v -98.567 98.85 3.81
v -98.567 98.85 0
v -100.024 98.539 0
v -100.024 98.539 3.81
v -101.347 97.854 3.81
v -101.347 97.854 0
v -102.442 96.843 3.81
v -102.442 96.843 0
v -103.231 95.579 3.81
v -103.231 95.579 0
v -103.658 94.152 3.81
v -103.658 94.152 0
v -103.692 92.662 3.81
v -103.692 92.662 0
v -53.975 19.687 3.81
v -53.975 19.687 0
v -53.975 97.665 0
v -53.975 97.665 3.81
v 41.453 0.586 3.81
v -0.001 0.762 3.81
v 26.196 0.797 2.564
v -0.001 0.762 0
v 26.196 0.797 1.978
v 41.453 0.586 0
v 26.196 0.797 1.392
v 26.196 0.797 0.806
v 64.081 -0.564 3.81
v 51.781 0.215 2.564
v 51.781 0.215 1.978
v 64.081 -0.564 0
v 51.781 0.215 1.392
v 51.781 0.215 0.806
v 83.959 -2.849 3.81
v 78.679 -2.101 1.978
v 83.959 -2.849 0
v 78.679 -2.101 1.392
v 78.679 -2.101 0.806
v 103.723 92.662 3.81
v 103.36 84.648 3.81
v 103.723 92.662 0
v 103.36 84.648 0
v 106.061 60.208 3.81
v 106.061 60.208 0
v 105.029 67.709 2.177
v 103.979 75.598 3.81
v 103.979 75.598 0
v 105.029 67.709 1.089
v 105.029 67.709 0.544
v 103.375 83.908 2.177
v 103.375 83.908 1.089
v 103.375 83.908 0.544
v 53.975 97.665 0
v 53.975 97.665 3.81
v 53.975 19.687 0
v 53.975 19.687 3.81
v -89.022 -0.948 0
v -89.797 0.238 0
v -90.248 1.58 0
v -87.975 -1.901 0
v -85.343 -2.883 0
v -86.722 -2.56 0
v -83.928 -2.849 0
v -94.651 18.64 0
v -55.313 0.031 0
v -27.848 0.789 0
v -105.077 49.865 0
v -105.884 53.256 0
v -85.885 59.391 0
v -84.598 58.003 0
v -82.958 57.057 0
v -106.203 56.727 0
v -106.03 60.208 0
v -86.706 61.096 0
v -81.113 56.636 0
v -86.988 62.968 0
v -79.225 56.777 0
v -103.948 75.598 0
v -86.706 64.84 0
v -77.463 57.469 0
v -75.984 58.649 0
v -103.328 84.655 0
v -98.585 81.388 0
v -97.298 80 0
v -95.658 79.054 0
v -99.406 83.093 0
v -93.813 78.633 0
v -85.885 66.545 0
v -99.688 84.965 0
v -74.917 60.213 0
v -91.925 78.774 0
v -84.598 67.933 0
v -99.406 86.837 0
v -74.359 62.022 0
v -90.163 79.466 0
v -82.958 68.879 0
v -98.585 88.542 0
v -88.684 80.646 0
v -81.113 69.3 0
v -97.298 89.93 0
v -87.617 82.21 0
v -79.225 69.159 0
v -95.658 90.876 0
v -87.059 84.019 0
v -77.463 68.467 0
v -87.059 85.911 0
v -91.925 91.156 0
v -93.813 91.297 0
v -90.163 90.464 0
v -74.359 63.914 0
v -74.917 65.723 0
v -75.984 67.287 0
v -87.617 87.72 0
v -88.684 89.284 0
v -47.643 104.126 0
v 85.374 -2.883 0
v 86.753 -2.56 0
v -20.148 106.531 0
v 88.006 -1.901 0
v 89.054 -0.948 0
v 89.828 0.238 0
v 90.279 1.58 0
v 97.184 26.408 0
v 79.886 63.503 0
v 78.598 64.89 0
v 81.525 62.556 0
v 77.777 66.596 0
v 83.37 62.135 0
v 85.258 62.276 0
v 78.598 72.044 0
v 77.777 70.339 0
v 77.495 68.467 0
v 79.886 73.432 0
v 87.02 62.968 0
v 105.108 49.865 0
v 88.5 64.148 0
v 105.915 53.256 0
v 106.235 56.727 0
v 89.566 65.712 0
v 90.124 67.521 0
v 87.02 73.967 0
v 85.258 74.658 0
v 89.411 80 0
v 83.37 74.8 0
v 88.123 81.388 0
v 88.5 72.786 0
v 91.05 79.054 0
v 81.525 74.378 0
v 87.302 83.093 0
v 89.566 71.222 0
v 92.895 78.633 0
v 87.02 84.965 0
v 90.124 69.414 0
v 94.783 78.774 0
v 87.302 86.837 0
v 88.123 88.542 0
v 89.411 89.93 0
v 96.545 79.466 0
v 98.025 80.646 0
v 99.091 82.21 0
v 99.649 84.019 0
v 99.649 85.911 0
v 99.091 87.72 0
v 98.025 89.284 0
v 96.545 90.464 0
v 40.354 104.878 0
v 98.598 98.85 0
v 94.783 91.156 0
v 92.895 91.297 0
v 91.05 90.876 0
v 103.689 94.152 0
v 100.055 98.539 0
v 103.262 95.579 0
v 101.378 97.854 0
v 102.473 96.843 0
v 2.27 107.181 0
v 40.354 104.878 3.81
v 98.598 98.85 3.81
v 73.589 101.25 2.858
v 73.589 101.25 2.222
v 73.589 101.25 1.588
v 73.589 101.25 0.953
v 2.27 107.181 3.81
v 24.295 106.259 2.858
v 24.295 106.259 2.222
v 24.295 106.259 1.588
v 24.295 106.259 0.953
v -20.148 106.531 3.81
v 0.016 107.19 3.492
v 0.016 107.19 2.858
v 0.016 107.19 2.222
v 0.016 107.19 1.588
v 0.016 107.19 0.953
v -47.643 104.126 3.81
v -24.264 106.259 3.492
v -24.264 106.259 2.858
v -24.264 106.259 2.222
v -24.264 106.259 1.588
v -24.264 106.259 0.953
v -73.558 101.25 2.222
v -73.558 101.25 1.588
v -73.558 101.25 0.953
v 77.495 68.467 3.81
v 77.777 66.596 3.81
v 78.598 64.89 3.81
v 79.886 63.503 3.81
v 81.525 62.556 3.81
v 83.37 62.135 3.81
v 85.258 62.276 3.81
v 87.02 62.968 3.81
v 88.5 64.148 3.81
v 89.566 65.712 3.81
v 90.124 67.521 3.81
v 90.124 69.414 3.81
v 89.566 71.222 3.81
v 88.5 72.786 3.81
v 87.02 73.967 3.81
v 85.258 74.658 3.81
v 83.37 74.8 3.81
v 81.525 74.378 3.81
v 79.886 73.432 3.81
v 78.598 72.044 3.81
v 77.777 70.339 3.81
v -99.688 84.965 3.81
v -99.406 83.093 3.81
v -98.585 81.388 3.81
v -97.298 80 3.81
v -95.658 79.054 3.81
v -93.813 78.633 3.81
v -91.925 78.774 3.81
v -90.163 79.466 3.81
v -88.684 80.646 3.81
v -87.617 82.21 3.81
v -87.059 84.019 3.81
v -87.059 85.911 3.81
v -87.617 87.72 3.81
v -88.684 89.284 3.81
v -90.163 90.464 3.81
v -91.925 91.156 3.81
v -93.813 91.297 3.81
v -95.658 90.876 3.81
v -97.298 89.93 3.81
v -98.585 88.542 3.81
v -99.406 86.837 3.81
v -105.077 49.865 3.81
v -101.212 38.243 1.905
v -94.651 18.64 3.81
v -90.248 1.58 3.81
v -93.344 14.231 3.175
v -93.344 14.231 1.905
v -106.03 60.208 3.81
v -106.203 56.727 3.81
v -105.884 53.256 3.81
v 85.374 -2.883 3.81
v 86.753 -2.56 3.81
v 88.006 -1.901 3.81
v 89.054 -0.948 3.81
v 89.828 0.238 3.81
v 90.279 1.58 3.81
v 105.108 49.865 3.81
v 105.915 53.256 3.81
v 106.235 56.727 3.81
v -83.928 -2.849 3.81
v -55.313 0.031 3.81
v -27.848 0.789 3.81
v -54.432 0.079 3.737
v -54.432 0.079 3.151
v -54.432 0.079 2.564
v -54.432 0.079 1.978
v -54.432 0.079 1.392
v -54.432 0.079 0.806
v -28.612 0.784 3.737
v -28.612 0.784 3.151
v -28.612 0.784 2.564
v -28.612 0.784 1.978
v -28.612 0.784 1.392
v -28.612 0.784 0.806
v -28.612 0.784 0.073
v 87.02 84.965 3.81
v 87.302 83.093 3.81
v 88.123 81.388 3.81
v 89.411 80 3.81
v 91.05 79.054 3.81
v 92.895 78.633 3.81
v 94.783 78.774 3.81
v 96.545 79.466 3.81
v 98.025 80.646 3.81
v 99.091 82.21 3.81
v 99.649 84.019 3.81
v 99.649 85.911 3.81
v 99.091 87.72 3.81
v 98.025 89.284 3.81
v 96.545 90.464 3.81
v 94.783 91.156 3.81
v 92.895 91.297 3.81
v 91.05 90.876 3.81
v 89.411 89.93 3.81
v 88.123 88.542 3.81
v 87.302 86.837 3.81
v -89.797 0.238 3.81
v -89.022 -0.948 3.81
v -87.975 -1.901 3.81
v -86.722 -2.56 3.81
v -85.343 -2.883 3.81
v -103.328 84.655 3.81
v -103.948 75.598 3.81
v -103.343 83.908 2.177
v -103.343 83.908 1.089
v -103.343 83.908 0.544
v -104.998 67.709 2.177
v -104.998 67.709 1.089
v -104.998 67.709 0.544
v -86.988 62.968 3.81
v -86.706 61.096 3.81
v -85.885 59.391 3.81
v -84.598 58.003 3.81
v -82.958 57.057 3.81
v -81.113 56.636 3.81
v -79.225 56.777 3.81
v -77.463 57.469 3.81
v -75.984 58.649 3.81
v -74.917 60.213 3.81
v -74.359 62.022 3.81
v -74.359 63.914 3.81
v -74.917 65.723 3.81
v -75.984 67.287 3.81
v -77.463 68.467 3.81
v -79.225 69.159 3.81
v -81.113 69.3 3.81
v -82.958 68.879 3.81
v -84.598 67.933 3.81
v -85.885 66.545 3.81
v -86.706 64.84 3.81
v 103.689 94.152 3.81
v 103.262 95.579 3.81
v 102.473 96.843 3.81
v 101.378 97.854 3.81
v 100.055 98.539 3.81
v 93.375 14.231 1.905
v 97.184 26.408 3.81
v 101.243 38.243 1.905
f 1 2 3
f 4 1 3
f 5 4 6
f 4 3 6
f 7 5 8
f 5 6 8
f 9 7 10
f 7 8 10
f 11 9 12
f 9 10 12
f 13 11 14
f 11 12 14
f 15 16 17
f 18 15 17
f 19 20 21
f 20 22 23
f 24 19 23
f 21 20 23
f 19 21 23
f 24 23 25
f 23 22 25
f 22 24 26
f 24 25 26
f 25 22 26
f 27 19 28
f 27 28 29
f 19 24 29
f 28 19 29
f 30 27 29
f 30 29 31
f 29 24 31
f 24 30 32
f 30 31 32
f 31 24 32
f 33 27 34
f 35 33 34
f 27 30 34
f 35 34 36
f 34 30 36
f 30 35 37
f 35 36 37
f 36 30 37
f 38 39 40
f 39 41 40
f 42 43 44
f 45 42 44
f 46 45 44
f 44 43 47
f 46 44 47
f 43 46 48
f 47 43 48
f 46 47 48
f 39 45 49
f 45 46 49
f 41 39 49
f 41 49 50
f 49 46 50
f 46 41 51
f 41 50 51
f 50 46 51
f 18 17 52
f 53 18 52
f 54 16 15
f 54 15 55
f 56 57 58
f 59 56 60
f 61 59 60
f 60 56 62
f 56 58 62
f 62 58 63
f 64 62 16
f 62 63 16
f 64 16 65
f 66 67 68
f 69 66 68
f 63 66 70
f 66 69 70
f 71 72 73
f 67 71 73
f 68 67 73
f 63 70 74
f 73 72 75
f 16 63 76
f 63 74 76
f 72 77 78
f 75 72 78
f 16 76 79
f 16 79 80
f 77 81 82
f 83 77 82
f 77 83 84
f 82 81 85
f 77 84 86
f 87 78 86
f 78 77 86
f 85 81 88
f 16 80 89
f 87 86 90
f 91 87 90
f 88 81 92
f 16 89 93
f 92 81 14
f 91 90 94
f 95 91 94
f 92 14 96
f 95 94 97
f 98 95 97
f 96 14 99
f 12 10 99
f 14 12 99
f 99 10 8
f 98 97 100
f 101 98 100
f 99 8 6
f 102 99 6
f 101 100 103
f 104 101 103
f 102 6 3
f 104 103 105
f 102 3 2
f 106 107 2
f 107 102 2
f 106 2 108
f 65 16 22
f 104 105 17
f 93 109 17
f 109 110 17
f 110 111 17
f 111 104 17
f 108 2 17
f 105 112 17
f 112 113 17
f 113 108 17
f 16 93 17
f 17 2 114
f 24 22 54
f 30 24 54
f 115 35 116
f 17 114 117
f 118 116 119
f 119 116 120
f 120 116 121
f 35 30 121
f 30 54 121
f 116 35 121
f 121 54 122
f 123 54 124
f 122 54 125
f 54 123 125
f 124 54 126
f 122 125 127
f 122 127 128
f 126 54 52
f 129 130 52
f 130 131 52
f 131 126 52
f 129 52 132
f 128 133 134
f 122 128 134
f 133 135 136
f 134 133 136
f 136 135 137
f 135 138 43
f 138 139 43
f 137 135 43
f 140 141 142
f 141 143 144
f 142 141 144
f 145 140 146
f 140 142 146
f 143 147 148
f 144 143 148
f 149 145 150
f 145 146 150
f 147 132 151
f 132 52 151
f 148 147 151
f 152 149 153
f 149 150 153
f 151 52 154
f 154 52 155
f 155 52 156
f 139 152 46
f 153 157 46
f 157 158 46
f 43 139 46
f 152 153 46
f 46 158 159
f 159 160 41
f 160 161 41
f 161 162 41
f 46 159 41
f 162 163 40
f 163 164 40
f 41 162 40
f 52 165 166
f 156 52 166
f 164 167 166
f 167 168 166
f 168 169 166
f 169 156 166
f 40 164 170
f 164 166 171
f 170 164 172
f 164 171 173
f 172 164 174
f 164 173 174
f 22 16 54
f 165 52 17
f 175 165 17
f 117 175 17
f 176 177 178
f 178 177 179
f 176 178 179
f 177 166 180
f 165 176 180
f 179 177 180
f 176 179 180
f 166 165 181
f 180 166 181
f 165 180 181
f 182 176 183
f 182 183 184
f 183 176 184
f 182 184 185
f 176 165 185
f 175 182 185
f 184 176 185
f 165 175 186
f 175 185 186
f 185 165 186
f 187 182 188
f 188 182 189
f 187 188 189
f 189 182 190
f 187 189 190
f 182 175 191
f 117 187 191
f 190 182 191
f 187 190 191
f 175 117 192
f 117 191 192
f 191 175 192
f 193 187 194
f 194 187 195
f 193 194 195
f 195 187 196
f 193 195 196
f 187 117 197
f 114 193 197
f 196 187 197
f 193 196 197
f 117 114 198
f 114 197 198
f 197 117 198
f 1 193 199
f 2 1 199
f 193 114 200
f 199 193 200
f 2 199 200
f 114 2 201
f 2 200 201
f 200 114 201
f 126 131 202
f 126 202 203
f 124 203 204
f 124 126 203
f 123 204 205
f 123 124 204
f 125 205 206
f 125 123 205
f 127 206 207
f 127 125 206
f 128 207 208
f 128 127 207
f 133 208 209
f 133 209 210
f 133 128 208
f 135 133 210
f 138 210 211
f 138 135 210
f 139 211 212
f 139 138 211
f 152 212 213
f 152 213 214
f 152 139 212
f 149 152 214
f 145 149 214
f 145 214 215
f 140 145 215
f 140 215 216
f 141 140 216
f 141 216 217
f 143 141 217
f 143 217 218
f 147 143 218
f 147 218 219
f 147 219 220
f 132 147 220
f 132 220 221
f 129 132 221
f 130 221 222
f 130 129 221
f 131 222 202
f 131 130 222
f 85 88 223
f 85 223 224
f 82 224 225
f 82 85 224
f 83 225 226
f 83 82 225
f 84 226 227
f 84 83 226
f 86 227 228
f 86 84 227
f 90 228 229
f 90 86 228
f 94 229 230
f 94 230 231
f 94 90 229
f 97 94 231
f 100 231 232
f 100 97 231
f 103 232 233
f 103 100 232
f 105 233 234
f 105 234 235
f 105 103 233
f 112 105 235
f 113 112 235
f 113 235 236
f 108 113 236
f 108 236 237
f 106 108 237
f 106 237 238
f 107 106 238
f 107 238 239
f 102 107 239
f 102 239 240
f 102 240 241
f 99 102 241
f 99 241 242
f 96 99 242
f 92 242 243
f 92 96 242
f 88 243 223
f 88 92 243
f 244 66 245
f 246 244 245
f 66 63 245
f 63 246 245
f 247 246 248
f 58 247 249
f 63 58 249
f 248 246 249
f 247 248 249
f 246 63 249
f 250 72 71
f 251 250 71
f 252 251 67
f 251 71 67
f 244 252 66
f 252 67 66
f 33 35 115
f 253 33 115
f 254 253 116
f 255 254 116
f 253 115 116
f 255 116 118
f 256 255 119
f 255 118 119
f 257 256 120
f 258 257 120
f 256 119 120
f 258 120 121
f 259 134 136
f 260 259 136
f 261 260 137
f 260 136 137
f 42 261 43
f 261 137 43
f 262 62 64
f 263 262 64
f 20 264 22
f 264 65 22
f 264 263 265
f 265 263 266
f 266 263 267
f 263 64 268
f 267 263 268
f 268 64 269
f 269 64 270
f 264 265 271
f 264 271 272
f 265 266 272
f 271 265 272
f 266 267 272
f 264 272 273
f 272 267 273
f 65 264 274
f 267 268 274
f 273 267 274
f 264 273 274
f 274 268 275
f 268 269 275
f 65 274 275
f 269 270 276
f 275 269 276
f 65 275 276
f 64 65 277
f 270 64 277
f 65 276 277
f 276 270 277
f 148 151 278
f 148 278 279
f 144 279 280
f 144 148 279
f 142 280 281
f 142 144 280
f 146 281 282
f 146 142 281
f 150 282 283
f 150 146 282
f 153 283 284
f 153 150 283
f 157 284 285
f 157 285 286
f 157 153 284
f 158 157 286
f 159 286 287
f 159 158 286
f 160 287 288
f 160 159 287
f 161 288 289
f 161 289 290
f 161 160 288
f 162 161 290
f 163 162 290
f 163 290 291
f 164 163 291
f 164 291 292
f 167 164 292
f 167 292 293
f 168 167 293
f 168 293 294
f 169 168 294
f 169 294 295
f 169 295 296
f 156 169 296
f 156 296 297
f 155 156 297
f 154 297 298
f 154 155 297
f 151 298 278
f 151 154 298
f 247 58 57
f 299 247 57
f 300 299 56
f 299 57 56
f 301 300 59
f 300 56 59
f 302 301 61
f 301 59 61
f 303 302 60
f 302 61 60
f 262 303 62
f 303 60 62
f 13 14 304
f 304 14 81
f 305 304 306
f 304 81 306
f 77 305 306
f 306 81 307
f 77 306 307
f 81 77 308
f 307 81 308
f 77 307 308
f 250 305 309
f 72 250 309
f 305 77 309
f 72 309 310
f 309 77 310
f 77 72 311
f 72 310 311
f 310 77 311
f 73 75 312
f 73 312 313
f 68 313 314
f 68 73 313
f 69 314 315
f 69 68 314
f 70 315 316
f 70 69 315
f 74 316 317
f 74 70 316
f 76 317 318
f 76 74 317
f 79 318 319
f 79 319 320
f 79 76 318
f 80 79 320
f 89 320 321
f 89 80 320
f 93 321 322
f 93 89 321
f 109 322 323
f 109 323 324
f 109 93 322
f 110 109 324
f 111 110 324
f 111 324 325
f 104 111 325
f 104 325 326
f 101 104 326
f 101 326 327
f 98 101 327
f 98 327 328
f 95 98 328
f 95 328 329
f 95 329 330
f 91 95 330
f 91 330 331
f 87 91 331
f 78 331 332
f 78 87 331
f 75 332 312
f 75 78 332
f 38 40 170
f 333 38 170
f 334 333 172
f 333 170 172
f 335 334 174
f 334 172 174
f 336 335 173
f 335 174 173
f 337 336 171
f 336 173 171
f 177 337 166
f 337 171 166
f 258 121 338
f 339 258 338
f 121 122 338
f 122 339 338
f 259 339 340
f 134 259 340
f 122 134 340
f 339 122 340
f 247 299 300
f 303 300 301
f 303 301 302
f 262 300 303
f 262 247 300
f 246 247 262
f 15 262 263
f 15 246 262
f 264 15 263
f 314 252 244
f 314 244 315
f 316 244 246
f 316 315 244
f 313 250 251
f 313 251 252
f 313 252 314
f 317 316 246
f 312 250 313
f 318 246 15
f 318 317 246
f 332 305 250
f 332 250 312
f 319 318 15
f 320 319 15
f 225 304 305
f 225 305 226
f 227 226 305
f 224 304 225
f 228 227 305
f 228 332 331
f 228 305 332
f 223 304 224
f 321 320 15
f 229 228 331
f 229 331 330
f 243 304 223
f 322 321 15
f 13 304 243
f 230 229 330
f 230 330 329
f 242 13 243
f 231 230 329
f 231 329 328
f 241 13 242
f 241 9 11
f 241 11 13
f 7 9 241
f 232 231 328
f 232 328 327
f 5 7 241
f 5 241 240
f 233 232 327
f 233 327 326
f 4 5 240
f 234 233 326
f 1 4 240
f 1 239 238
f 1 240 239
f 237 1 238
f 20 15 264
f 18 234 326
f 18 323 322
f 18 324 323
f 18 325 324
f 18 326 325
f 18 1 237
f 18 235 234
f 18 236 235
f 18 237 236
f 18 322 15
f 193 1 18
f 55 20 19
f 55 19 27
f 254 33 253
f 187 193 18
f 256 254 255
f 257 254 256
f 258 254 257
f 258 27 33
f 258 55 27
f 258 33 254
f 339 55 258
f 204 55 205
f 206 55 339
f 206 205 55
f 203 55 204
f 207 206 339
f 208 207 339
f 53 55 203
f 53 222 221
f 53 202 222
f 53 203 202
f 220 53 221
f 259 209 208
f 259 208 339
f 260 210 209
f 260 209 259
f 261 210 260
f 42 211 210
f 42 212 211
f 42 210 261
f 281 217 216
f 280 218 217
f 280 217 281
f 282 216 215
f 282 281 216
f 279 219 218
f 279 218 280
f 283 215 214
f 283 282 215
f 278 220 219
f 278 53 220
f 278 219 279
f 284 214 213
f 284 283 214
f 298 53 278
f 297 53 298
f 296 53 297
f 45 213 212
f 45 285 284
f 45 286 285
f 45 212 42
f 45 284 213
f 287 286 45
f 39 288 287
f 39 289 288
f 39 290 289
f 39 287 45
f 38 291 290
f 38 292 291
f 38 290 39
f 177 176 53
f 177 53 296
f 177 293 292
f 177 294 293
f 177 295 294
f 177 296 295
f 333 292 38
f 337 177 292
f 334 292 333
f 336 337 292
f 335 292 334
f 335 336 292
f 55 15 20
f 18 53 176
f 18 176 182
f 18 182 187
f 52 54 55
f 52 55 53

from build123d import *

# Parameters (mm, degrees)
SKETCH1_R           = 6.35
SKETCH1_W           = 107.95
SKETCH1_H           = 77.978
BOSS_EXTRUDE1_DEPTH = 3.81


with BuildPart() as part:
    # Sketch1 → Boss-Extrude1 (new body)
    with BuildSketch(Plane.XY):
        with BuildLine():
            ThreePointArc((-90.247945126, 1.580161299), (-87.975141882, -1.900637883), (-83.927585414, -2.848732901))
            add(Edge.make_bspline(
                [(-83.927585414, -2.848732901), (-83.054070471, -2.715786742), (-81.312732205, -2.460099658), (-78.654295906, -2.097457818), (-75.966491195, -1.758240891), (-72.336992818, -1.336160635), (-68.643939449, -0.959865866), (-65.583983691, -0.690535221), (-64.166779255, -0.573734085), (-63.566148315, -0.525577724), (-63.104217983, -0.489316665), (-62.699894104, -0.457970525), (-61.962459601, -0.401810292), (-60.915867879, -0.325087188), (-59.217621249, -0.20679221), (-57.068227268, -0.068668175), (-54.439670256, 0.082013873), (-51.767032951, 0.217415022), (-49.490906759, 0.318006821), (-48.009034739, 0.376639561), (-47.303600356, 0.403182815), (-46.87624745, 0.418937653), (-46.196192411, 0.443333549), (-45.175910497, 0.47801298), (-43.54019985, 0.529440772), (-41.442918551, 0.587830962), (-38.856544752, 0.647964805), (-36.195775126, 0.698343729), (-33.919375463, 0.73216057), (-32.406847373, 0.750213929), (-31.706246722, 0.757752509), (-31.408404648, 0.760817662), (-31.181163199, 0.763075054), (-31.021391801, 0.764629932), (-30.707730066, 0.767603553), (-30.26986268, 0.771505625), (-29.546357408, 0.777455403), (-28.619562792, 0.78413893), (-27.465024779, 0.791021083), (-25.871235622, 0.798660769), (-23.776420321, 0.805345875), (-21.095419523, 0.808788849), (-18.730229007, 0.807870354), (-16.988945077, 0.805198844), (-16.118237596, 0.803410927), (-15.586446283, 0.802172614), (-15.160582097, 0.801119107), (-14.629388092, 0.799779587), (-13.778859371, 0.797542602), (-12.290567631, 0.793391761), (-10.165619586, 0.786950406), (-7.609712384, 0.777596832), (-4.232901772, 0.76670962), (-1.692574695, 0.762894866), (-0.000735939, 0.762000495)],
                knots=[0.344883789, 0.344883789, 0.344883789, 0.344883789, 0.365355884, 0.385827978, 0.406300073, 0.426772167, 0.467716357, 0.488188451, 0.493306475, 0.498424499, 0.50098351, 0.503542522, 0.508660546, 0.518896593, 0.529132641, 0.549604735, 0.57007683, 0.590548924, 0.611021019, 0.621257066, 0.623816078, 0.62637509, 0.631493114, 0.641729161, 0.651965208, 0.672437303, 0.692909397, 0.713381492, 0.733853587, 0.744089634, 0.746648646, 0.749207658, 0.750487163, 0.751766669, 0.754325681, 0.759443705, 0.764561728, 0.774797776, 0.785033823, 0.79526987, 0.815741965, 0.83621406, 0.856686154, 0.866922202, 0.872040225, 0.874599237, 0.877158249, 0.882276272, 0.887394296, 0.897630343, 0.918102438, 0.938574533, 0.959046627, 0.999990816, 0.999990816, 0.999990816, 0.999990816], degree=3))
            add(Edge.make_bspline(
                [(-0.000735939, 0.762000495), (1.697316836, 0.766177734), (4.244409913, 0.77253852), (7.640476943, 0.781209392), (10.187668405, 0.787807526), (12.309879884, 0.793384892), (13.796306461, 0.797330932), (14.644321151, 0.799597123), (15.177550854, 0.80101974), (15.596748301, 0.802157809), (16.118287, 0.803504136), (16.973995966, 0.80545727), (18.68829658, 0.808424504), (21.027999055, 0.809635512), (23.697872289, 0.806345409), (25.799893716, 0.79962074), (27.409267347, 0.791849991), (28.580317931, 0.784820707), (29.525162279, 0.777971464), (30.265021199, 0.771870135), (30.715280941, 0.767851736), (31.035813921, 0.764814821), (31.203310927, 0.763185732), (31.424674383, 0.760990419), (31.725461502, 0.75790149), (32.424670998, 0.75038892), (33.939142843, 0.732342076), (36.215243056, 0.698563653), (38.877142881, 0.648210549), (41.464408025, 0.588096862), (43.562364845, 0.52972496), (45.199123553, 0.478290291), (46.218966314, 0.443646588), (46.900949422, 0.419191941), (47.325920748, 0.403533269), (48.032310107, 0.376969373), (49.513622078, 0.318385817), (51.790729101, 0.217796458), (54.463869347, 0.082412308), (57.093216384, -0.068273652), (59.243322334, -0.206412508), (60.942131401, -0.324720902), (61.989228303, -0.401465522), (62.726751965, -0.457620494), (63.131559362, -0.488998275), (63.592361081, -0.52516306), (64.193703385, -0.573365144), (65.61087209, -0.690141767), (68.671780552, -0.959508913), (72.365460908, -1.33583339), (75.995808252, -1.757987944), (78.68423516, -2.097273121), (81.343310776, -2.459998054), (83.085085672, -2.715750704), (83.958817154, -2.848731481)],
                knots=[9.152e-06, 9.152e-06, 9.152e-06, 9.152e-06, 0.040956877, 0.06143074, 0.081904603, 0.102378465, 0.112615397, 0.117733862, 0.122852328, 0.125411561, 0.127970794, 0.133089259, 0.143326191, 0.163800053, 0.184273916, 0.204747779, 0.21498471, 0.225221641, 0.235458573, 0.240577038, 0.245695504, 0.248254737, 0.249534353, 0.25081397, 0.253373202, 0.255932435, 0.266169367, 0.286643229, 0.307117092, 0.327590954, 0.348064817, 0.358301748, 0.36853868, 0.373657145, 0.376216378, 0.378775611, 0.389012542, 0.409486405, 0.429960268, 0.45043413, 0.470907993, 0.481144924, 0.491381856, 0.496500321, 0.499059554, 0.501618787, 0.506737253, 0.511855718, 0.532329581, 0.573277306, 0.593751169, 0.614225032, 0.634698894, 0.655172757, 0.655172757, 0.655172757, 0.655172757], degree=3))
            ThreePointArc((83.958817154, -2.848731481), (88.006379638, -1.900641004), (90.279187133, 1.58016116))
            add(Edge.make_bspline(
                [(90.279187133, 1.58016116), (90.707255223, 3.721330409), (91.671139987, 8.001579794), (93.903510476, 16.331728227), (97.14338237, 26.467199173), (100.58708015, 36.306691054), (103.244940111, 44.084996329), (104.500326759, 47.928352327), (105.108428455, 49.864950567)],
                knots=[-0.293557602, -0.293557602, -0.293557602, -0.293557602, -0.147731648, -0.001905695, 0.289746211, 0.581398118, 0.727224071, 0.873050024, 0.873050024, 0.873050024, 0.873050024], degree=3))
            ThreePointArc((105.108428455, 49.864950567), (106.136144084, 54.985756874), (106.061342514, 60.208137689))
            add(Edge.make_bspline(
                [(106.061342514, 60.208137689), (105.911666294, 61.444092118), (105.583988035, 63.887611007), (104.845109607, 68.962564326), (103.906894516, 75.52680744), (103.330597064, 82.448292199), (103.345249689, 87.49082735), (103.504349867, 90.423192606), (103.641008775, 91.919668099), (103.72344879, 92.661964135)],
                knots=[0.224037882, 0.224037882, 0.224037882, 0.224037882, 0.367934399, 0.511830915, 0.799623948, 1.087416981, 1.231313498, 1.303261756, 1.375210014, 1.375210014, 1.375210014, 1.375210014], degree=3))
            ThreePointArc((103.72344879, 92.661964135), (102.473247846, 96.843092134), (98.598214744, 98.850317136))
            add(Edge.make_bspline(
                [(98.598214744, 98.850317136), (94.416094473, 99.172048045), (86.049981349, 99.919191974), (69.422551197, 101.674055975), (48.779184165, 104.086919071), (28.344626534, 106.081432238), (12.109022695, 107.012529299), (4.052738444, 107.190075663), (0.015621033, 107.190075663)],
                knots=[0.21837869, 0.21837869, 0.21837869, 0.21837869, 0.316081353, 0.413784017, 0.609189345, 0.804594672, 0.902297336, 1, 1, 1, 1], degree=3))
            add(Edge.make_bspline(
                [(0.015621033, 107.190075663), (-4.021496378, 107.190075663), (-12.077780629, 107.012529299), (-28.313384468, 106.081432237), (-48.747942099, 104.08691907), (-69.39130913, 101.674055973), (-86.018739283, 99.919191972), (-94.384852407, 99.172048042), (-98.566972677, 98.850317134)],
                knots=[0, 0, 0, 0, 0.097702664, 0.195405328, 0.390810655, 0.586215983, 0.683918647, 0.78162131, 0.78162131, 0.78162131, 0.78162131], degree=3))
            ThreePointArc((-98.566972677, 98.850317134), (-102.442005779, 96.843092132), (-103.692206724, 92.661964133))
            add(Edge.make_bspline(
                [(-103.692206724, 92.661964133), (-103.609766709, 91.919668097), (-103.4731078, 90.423192604), (-103.314007622, 87.490827347), (-103.299354998, 82.448292195), (-103.875652451, 75.526807436), (-104.813867543, 68.962564321), (-105.552745972, 63.887611001), (-105.880424231, 61.444092112), (-106.030100451, 60.208137683)],
                knots=[-0.375210014, -0.375210014, -0.375210014, -0.375210014, -0.303261756, -0.231313498, -0.087416981, 0.200376052, 0.488169085, 0.632065601, 0.775962118, 0.775962118, 0.775962118, 0.775962118], degree=3))
            ThreePointArc((-106.030100451, 60.208137683), (-106.104902022, 54.985756873), (-105.077186396, 49.864950571))
            add(Edge.make_bspline(
                [(-105.077186396, 49.864950571), (-104.469084703, 47.928352336), (-103.213698061, 44.084996348), (-100.555838111, 36.306691093), (-97.112140347, 26.467199238), (-93.872268464, 16.33172832), (-91.63989798, 8.001579913), (-90.676013216, 3.721330541), (-90.247945126, 1.580161299)],
                knots=[0.126949976, 0.126949976, 0.126949976, 0.126949976, 0.272775929, 0.418601881, 0.710253787, 1.001905692, 1.147731645, 1.293557598, 1.293557598, 1.293557598, 1.293557598], degree=3))
        make_face()
        with Locations(Location((-93.338434532, 84.965075663, 0), (0, 0, 180))):
            Circle(SKETCH1_R, mode=Mode.SUBTRACT)
        with Locations(Location((93.369676598, 84.965075663, 0), (0, 0, 180))):
            Circle(SKETCH1_R, mode=Mode.SUBTRACT)
        with Locations(Location((-80.638434532, 62.968030407, 0), (0, 0, 180))):
            Circle(SKETCH1_R, mode=Mode.SUBTRACT)
        with Locations(Location((83.844676598, 68.467291721, 0), (0, 0, 180))):
            Circle(SKETCH1_R, mode=Mode.SUBTRACT)
        with Locations((0, 58.676075663)):
            Rectangle(SKETCH1_W, SKETCH1_H, mode=Mode.SUBTRACT)
    extrude(amount=BOSS_EXTRUDE1_DEPTH)


solid = part.part
